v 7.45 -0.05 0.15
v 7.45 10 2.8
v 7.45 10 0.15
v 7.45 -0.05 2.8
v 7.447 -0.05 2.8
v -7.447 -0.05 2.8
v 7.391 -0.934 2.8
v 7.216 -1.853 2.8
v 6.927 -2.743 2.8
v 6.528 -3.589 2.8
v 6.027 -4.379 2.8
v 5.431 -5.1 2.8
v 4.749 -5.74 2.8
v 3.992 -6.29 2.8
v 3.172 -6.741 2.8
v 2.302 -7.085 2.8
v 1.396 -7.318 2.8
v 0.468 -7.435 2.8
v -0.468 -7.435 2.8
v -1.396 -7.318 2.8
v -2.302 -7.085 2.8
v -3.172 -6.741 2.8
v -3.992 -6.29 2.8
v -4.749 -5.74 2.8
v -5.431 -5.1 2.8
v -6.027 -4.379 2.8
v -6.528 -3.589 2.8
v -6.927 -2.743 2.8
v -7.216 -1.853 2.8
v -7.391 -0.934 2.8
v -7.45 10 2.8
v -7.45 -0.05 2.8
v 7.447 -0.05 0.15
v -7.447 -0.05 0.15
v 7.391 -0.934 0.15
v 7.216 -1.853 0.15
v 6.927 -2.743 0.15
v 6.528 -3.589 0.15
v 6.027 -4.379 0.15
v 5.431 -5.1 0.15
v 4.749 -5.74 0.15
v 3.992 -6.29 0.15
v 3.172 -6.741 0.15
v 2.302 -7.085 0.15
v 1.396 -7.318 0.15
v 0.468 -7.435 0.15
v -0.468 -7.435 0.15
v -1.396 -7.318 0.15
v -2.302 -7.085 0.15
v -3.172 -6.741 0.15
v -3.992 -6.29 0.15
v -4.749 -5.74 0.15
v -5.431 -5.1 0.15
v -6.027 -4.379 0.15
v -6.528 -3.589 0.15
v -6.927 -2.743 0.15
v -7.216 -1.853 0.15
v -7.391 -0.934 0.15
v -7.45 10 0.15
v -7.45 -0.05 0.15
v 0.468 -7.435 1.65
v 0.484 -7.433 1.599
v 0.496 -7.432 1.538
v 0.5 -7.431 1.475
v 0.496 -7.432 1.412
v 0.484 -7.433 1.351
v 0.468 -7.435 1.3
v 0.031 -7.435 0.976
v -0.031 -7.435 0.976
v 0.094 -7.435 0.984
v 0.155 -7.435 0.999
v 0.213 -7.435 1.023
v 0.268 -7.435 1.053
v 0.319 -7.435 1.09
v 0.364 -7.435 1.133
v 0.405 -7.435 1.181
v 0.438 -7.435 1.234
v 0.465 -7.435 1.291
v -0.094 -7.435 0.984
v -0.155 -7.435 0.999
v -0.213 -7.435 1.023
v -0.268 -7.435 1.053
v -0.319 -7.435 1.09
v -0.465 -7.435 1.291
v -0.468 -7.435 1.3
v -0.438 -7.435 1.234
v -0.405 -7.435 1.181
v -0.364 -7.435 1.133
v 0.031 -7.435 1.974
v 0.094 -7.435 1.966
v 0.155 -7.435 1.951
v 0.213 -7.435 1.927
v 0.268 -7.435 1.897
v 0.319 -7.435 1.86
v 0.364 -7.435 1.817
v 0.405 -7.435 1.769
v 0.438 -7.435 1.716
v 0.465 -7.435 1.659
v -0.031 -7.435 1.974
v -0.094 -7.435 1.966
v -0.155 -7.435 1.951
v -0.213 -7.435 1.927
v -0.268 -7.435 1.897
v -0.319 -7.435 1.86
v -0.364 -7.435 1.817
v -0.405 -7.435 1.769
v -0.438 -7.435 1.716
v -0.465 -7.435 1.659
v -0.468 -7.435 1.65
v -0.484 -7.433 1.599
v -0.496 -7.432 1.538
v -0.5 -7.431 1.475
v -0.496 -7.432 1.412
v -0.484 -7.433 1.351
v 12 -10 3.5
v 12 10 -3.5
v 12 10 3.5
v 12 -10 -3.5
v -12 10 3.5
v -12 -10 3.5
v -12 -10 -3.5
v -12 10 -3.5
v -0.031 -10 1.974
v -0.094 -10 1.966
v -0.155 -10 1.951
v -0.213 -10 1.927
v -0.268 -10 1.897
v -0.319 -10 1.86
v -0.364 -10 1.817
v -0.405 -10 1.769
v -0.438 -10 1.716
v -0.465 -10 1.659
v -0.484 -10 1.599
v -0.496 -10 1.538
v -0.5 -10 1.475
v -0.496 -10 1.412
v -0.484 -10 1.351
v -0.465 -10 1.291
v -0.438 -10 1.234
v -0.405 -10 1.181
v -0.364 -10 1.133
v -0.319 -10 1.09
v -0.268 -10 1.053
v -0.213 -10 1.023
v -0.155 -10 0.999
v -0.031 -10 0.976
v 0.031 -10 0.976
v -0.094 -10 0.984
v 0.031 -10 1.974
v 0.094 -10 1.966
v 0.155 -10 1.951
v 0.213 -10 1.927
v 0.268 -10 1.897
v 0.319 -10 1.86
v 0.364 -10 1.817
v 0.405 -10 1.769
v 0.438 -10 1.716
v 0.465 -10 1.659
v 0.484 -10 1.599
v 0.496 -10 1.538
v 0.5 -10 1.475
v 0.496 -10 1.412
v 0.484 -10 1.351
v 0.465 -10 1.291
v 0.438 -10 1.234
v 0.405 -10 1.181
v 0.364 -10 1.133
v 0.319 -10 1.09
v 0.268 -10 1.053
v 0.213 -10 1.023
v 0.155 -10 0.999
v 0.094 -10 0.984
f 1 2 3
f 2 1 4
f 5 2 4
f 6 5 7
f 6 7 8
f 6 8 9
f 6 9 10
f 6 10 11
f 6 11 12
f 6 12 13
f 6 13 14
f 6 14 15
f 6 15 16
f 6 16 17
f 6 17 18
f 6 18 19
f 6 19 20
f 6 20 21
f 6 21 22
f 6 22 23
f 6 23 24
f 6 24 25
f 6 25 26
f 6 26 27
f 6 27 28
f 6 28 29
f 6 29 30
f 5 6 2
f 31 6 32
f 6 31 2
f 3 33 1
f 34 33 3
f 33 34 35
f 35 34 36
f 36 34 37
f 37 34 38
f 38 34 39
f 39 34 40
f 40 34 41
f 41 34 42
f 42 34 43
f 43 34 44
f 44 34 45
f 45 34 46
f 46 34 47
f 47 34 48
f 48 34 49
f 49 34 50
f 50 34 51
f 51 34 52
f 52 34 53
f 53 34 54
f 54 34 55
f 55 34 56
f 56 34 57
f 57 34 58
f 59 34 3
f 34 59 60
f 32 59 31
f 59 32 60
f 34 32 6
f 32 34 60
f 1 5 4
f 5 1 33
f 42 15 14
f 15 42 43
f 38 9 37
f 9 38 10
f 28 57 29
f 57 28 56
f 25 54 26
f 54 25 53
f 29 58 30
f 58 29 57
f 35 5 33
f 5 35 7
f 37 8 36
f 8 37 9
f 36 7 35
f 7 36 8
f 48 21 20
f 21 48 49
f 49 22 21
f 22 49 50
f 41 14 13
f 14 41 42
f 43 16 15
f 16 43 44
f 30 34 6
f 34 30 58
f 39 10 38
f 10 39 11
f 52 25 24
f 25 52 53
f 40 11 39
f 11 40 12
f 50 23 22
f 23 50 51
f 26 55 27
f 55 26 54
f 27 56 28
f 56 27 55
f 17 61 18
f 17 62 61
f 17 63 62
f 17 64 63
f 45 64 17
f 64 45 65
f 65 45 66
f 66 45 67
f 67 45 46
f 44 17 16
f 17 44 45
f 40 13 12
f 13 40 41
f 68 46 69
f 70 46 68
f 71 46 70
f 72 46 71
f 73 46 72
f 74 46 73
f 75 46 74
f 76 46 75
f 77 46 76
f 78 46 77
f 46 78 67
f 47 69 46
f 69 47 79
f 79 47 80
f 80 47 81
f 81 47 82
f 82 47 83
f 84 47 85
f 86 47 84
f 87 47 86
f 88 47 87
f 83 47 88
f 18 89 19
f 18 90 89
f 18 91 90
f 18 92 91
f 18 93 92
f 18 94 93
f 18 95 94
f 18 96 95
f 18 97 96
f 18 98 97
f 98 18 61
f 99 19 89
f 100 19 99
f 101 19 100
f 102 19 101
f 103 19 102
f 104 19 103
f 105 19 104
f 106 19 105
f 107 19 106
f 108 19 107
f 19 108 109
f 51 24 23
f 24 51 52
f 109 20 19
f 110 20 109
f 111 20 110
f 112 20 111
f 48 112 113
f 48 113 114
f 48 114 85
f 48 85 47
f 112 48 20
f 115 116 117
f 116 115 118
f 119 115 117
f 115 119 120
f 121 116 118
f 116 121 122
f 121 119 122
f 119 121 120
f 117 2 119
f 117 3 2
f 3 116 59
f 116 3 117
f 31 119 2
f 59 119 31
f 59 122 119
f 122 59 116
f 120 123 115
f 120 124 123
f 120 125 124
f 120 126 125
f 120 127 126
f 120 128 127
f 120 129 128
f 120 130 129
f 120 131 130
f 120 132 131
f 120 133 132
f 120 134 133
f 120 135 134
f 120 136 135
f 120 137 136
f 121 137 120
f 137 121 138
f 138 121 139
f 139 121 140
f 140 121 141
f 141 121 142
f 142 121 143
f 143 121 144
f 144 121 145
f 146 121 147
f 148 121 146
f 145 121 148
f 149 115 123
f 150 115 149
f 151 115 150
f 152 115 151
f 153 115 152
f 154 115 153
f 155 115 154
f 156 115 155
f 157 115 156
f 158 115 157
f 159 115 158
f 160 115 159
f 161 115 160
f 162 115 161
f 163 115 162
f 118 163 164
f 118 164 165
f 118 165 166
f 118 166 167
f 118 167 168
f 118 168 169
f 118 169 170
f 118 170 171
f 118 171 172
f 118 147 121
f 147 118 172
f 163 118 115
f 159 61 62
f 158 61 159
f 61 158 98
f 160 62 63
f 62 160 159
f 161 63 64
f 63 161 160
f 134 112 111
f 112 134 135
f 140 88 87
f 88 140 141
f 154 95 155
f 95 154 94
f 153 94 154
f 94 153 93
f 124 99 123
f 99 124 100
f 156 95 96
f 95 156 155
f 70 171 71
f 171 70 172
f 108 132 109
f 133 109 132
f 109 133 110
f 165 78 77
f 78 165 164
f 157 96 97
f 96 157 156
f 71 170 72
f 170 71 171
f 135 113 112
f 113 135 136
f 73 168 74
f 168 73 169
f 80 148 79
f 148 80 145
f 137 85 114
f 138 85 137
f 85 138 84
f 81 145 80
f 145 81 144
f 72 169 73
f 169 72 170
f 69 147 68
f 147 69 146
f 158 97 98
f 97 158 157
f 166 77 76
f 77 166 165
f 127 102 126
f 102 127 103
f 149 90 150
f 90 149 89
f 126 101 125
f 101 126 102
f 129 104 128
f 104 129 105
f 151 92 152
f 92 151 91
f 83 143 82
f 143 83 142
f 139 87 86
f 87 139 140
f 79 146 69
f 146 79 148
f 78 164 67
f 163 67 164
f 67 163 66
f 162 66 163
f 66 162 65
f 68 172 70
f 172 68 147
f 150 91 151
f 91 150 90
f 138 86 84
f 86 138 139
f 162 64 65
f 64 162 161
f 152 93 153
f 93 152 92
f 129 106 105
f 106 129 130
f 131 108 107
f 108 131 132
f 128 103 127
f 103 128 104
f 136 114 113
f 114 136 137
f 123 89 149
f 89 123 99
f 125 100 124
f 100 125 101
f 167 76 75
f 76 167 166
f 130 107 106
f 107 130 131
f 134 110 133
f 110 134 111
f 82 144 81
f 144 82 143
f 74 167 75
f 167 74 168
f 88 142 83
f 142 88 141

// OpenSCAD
// file: 3d.scad
module disc(diameter, depth, center = false) {
  translate([ 0, 0, center ? -depth / 2 : 0 ]) {
    linear_extrude(depth) { circle(d = diameter); }
  }
}
// file: 2d.scad
$fn = 50;

module arc(outer_diameter, thickness) {
  intersection() {
    half_circle(outer_diameter, thickness);

    translate([ -outer_diameter / 2, 0, 0 ]) square(outer_diameter);
  }
}

module circle_border(outer_diameter, thickness) {
  difference() {
    circle(d = outer_diameter);
    circle(d = outer_diameter - 2 * thickness);
  }
}

module half_circle(outer_diameter, thickness) {
  difference() {
    circle_border(outer_diameter, thickness);

    translate([ 0, -outer_diameter / 2, 0 ]) {
      square([ outer_diameter / 2, outer_diameter ]);
    }
  }
}

module slot(width, height) {
  $diameter = height;
  $square_width = width - $diameter;

  union() {
    translate([ -$square_width / 2, 0, 0 ]) circle(d = $diameter);

    square([ $square_width, height ], center = true);

    translate([ $square_width / 2, 0, 0 ]) circle(d = $diameter);
  }
}

module slot_border(outer_width, outer_height, thickness) {
  difference() {
    slot(outer_width, outer_height);
    slot(outer_width - 2 * thickness, outer_height - 2 * thickness);
  }
}

// linear_extrude(20) slot_border(60, 30, 3);
// main file
$fn = 50;

use <2d.scad>
use <3d.scad>

$magnet_outer_diameter = 14.74;
$magnet_inner_diameter = 3.78;
$magnet_depth = 2.58;

$magnet_slot_depth = 2.65;
$magnet_slot_diameter = 14.9;
$magnet_wall_width = 0.7;
$magnet_removal_hole_diameter = 1;

module magnet_holder(
    width, height, depth, magnet_slot_diameter = $magnet_slot_diameter,
    magnet_slot_depth = $magnet_slot_depth,
    magnet_wall_width = $magnet_wall_width,
    magnet_removal_hole_diameter = $magnet_removal_hole_diameter) {
  assert(width > magnet_slot_diameter, "Slot must be wider than the magnet.");
  assert(height > magnet_slot_diameter, "Slot must be higher than the magnet.");
  assert(depth > magnet_slot_depth, "Slot must be deeper than the magnet.");

  difference() {
    cube([ width, height, depth ], center = true);

    $magnet_z_offset = (depth - magnet_slot_depth) / 2 - magnet_wall_width;

    // The magnet slot
    translate([ 0, 0, $magnet_z_offset ]) {
      magnet_slot(magnet_slot_diameter, magnet_slot_depth, height);
    }

    // Hole to allow removing the magnet
    translate([ 0, 0, $magnet_z_offset ]) rotate([ 90, 0, 0 ]) {
      cylinder(d = magnet_removal_hole_diameter, h = height, center = true);
    }
  }
}

module magnet_slot(diameter, depth, height) {
  union() {
    // The slot where the magnet should pass
    translate([ 0, height / 4, 0 ]) {
      cube([ diameter, height / 2 + 0.1, depth ], center = true);
    }

    // The magnet
    disc(diameter, depth, center = true);
  }
}

magnet_holder(24, 20, 7);
